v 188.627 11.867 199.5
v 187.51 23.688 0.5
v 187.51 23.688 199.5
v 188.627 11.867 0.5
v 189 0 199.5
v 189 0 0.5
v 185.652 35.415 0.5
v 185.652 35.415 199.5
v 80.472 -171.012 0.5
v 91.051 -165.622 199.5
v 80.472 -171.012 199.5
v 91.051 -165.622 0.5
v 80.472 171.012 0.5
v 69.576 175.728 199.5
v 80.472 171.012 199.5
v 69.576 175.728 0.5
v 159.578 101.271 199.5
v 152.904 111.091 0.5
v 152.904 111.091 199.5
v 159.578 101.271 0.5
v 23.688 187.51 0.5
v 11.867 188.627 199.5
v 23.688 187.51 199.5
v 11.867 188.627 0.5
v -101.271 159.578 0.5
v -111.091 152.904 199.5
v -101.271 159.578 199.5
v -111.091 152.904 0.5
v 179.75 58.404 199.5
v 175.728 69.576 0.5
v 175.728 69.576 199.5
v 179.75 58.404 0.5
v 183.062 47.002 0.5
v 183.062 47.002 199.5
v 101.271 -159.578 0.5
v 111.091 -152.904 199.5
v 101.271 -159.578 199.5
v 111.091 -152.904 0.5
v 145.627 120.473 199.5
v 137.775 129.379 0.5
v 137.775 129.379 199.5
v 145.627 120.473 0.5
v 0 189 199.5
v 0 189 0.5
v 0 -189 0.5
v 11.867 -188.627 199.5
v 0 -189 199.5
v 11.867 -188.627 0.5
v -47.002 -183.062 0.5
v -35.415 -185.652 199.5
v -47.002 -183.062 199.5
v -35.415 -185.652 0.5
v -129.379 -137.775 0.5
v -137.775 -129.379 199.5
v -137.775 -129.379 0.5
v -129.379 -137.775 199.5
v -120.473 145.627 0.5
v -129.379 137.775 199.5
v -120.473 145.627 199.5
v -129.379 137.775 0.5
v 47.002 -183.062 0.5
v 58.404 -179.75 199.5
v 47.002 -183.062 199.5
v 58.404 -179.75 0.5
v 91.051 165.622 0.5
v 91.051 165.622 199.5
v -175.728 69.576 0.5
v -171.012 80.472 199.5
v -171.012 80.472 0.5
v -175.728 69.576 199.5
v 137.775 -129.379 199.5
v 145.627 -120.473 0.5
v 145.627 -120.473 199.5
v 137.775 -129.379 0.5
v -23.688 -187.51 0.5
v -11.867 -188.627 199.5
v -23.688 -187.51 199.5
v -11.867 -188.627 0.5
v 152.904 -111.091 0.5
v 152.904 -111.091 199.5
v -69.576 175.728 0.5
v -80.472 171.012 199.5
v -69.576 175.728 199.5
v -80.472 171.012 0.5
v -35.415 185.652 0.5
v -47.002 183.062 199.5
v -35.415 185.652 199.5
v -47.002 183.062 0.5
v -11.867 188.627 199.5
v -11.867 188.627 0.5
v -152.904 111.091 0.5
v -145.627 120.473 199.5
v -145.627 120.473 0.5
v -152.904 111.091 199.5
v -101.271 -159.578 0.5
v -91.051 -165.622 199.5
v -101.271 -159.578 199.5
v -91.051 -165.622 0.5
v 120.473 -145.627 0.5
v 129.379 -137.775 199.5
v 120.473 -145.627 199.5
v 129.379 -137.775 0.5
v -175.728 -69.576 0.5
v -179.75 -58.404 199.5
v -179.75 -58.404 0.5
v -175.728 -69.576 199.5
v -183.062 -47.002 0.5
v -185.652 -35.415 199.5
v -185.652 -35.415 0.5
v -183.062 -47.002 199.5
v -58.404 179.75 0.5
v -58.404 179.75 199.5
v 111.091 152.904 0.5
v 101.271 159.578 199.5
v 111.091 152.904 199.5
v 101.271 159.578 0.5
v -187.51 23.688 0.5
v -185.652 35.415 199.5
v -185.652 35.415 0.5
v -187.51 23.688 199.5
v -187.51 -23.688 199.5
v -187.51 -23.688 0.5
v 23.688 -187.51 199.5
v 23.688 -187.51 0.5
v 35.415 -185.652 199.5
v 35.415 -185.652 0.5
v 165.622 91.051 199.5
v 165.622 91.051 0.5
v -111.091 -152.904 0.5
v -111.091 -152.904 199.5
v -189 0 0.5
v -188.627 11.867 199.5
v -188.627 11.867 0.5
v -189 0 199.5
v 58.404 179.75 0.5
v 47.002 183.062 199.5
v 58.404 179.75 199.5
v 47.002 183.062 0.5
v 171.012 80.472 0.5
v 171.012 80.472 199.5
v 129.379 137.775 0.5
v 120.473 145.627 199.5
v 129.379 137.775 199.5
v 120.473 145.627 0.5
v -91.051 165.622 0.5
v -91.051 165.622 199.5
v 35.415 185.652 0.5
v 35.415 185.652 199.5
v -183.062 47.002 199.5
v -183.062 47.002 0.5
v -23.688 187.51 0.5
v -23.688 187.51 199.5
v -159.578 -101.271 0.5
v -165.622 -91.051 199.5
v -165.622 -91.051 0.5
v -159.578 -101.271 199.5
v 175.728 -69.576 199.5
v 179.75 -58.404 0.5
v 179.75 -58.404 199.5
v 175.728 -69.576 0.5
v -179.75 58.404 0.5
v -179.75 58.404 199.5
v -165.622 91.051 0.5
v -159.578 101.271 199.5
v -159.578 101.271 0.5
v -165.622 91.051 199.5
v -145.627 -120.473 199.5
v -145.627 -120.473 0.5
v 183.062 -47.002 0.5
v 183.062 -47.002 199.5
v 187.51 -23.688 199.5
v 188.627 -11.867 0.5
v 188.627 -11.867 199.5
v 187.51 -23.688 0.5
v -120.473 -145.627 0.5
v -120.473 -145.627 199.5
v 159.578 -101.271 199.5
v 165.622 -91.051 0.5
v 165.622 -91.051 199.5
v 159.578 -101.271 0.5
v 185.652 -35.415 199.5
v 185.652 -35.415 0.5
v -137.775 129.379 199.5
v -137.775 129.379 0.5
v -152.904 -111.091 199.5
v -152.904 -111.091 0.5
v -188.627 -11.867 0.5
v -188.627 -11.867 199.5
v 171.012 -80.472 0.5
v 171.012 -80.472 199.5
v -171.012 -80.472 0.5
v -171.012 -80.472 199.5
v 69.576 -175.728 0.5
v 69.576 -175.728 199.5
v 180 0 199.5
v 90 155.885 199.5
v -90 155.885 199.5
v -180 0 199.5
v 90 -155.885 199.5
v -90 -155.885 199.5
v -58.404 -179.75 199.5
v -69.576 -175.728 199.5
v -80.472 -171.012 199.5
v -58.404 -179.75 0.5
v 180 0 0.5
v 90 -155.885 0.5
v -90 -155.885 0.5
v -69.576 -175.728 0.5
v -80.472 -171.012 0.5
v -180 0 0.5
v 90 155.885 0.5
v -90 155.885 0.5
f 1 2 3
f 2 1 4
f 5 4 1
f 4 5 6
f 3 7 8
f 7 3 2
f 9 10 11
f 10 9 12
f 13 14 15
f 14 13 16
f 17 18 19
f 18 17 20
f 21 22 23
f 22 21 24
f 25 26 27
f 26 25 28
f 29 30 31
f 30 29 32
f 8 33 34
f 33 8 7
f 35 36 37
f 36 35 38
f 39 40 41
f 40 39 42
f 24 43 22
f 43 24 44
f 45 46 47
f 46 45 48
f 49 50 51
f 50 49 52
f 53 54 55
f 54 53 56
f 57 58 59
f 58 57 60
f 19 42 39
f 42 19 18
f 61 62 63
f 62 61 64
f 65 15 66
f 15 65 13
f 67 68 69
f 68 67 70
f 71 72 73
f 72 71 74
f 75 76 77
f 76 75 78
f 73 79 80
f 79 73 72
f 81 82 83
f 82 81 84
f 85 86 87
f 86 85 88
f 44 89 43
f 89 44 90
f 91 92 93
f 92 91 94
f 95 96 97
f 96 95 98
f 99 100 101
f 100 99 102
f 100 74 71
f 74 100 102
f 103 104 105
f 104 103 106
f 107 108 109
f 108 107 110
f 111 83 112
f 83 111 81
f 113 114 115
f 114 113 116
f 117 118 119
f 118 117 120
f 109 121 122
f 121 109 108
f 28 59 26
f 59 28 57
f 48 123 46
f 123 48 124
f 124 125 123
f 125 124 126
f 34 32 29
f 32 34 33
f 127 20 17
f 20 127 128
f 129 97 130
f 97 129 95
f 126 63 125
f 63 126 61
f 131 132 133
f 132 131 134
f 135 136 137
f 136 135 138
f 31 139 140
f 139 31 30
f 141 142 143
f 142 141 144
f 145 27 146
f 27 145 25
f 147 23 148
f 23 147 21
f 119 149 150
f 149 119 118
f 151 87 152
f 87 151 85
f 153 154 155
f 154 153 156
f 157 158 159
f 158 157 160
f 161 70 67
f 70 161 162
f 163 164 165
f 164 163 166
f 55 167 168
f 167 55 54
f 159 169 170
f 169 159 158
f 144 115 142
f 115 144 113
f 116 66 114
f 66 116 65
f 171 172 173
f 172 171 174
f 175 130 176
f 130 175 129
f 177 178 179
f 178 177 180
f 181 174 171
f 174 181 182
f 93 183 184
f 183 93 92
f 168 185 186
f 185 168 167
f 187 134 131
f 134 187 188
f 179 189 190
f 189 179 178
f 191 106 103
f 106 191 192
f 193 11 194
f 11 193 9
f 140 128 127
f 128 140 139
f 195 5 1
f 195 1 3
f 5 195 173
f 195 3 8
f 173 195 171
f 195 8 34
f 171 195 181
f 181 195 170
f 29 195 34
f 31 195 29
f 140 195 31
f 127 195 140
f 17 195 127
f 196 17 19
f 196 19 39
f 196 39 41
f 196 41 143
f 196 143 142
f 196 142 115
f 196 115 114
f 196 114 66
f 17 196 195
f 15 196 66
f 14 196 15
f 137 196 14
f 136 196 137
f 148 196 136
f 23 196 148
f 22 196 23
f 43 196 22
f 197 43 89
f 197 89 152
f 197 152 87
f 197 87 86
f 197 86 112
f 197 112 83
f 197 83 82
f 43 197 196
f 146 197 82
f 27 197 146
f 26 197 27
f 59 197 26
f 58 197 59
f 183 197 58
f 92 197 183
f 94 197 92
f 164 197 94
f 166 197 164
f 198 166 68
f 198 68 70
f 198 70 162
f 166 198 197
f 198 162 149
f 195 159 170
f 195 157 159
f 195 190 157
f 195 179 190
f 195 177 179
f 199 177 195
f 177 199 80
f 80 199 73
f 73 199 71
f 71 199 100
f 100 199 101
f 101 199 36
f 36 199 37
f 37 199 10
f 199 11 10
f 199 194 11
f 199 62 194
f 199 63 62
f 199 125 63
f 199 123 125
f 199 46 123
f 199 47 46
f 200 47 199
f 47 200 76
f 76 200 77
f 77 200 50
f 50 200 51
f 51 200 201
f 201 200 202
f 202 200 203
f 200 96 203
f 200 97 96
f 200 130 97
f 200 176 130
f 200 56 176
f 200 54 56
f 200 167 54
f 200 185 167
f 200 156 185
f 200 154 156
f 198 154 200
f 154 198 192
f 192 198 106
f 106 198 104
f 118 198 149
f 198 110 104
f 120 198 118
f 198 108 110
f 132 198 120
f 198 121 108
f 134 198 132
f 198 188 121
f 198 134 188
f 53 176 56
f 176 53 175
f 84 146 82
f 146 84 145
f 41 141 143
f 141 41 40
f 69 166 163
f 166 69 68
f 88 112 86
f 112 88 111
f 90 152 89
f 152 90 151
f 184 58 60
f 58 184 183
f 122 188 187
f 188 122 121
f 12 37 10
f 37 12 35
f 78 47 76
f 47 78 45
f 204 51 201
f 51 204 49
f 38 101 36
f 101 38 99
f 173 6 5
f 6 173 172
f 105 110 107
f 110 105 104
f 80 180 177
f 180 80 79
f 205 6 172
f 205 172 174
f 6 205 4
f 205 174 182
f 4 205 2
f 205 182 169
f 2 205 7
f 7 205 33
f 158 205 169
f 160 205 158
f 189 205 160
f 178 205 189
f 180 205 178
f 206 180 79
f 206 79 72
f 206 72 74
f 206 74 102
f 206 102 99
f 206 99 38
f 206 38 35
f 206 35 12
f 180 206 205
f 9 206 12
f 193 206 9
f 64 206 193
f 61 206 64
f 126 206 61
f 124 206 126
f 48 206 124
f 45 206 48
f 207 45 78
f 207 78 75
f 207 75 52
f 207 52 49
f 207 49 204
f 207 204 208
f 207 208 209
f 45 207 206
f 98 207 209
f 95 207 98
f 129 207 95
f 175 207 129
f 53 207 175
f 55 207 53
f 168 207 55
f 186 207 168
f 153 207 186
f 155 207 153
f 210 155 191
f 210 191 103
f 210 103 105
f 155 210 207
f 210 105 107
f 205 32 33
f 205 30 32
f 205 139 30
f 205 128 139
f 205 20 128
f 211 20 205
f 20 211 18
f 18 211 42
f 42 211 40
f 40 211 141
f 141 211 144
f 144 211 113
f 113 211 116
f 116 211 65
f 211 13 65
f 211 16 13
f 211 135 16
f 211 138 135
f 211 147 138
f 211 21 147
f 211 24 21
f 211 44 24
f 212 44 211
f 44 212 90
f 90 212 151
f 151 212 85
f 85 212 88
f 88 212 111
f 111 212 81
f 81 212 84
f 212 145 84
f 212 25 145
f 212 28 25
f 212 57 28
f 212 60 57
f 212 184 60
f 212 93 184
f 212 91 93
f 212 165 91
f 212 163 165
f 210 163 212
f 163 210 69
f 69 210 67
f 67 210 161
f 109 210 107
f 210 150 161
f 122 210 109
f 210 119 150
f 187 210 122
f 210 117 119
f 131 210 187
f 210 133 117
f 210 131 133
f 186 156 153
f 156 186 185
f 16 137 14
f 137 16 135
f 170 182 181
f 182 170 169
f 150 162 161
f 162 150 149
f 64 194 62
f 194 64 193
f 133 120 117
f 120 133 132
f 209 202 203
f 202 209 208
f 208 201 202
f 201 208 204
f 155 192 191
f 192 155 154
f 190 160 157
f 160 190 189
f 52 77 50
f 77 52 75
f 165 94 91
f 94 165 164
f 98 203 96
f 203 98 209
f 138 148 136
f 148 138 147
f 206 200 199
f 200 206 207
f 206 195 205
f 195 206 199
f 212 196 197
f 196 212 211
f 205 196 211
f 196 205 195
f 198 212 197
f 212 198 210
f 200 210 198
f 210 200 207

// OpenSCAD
difference() {
translate([0,0,100]) {cylinder (r = 189, h = 199, $fn = 100, center = true);}

union() {
linear_extrude(height = 200, twist = 90, $fn = 400) translate([-50,-100,0]){import(file = "wing.dxf", center = false, $fn = 100);} rotate([0,30,0]);

rotate([0,0,90]) {linear_extrude(height = 200, twist = 90, $fn = 400) translate([-50,-100,0]){import(file = "wing.dxf", center = false, $fn = 100);} rotate([0,30,0]);}

rotate([0,0,180]) {linear_extrude(height = 200, twist = 90, $fn = 400) translate([-50,-100,0]){import(file = "wing.dxf", center = false, $fn = 100);} rotate([0,30,0]);}

rotate([0,0,270]) {linear_extrude(height = 200, twist = 90, $fn = 400) translate([-50,-100,0]){import(file = "wing.dxf", center = false, $fn = 100);} rotate([0,30,0]);}
}
cylinder(h = 400, r = 180, center = true, $fn = 6);
}
